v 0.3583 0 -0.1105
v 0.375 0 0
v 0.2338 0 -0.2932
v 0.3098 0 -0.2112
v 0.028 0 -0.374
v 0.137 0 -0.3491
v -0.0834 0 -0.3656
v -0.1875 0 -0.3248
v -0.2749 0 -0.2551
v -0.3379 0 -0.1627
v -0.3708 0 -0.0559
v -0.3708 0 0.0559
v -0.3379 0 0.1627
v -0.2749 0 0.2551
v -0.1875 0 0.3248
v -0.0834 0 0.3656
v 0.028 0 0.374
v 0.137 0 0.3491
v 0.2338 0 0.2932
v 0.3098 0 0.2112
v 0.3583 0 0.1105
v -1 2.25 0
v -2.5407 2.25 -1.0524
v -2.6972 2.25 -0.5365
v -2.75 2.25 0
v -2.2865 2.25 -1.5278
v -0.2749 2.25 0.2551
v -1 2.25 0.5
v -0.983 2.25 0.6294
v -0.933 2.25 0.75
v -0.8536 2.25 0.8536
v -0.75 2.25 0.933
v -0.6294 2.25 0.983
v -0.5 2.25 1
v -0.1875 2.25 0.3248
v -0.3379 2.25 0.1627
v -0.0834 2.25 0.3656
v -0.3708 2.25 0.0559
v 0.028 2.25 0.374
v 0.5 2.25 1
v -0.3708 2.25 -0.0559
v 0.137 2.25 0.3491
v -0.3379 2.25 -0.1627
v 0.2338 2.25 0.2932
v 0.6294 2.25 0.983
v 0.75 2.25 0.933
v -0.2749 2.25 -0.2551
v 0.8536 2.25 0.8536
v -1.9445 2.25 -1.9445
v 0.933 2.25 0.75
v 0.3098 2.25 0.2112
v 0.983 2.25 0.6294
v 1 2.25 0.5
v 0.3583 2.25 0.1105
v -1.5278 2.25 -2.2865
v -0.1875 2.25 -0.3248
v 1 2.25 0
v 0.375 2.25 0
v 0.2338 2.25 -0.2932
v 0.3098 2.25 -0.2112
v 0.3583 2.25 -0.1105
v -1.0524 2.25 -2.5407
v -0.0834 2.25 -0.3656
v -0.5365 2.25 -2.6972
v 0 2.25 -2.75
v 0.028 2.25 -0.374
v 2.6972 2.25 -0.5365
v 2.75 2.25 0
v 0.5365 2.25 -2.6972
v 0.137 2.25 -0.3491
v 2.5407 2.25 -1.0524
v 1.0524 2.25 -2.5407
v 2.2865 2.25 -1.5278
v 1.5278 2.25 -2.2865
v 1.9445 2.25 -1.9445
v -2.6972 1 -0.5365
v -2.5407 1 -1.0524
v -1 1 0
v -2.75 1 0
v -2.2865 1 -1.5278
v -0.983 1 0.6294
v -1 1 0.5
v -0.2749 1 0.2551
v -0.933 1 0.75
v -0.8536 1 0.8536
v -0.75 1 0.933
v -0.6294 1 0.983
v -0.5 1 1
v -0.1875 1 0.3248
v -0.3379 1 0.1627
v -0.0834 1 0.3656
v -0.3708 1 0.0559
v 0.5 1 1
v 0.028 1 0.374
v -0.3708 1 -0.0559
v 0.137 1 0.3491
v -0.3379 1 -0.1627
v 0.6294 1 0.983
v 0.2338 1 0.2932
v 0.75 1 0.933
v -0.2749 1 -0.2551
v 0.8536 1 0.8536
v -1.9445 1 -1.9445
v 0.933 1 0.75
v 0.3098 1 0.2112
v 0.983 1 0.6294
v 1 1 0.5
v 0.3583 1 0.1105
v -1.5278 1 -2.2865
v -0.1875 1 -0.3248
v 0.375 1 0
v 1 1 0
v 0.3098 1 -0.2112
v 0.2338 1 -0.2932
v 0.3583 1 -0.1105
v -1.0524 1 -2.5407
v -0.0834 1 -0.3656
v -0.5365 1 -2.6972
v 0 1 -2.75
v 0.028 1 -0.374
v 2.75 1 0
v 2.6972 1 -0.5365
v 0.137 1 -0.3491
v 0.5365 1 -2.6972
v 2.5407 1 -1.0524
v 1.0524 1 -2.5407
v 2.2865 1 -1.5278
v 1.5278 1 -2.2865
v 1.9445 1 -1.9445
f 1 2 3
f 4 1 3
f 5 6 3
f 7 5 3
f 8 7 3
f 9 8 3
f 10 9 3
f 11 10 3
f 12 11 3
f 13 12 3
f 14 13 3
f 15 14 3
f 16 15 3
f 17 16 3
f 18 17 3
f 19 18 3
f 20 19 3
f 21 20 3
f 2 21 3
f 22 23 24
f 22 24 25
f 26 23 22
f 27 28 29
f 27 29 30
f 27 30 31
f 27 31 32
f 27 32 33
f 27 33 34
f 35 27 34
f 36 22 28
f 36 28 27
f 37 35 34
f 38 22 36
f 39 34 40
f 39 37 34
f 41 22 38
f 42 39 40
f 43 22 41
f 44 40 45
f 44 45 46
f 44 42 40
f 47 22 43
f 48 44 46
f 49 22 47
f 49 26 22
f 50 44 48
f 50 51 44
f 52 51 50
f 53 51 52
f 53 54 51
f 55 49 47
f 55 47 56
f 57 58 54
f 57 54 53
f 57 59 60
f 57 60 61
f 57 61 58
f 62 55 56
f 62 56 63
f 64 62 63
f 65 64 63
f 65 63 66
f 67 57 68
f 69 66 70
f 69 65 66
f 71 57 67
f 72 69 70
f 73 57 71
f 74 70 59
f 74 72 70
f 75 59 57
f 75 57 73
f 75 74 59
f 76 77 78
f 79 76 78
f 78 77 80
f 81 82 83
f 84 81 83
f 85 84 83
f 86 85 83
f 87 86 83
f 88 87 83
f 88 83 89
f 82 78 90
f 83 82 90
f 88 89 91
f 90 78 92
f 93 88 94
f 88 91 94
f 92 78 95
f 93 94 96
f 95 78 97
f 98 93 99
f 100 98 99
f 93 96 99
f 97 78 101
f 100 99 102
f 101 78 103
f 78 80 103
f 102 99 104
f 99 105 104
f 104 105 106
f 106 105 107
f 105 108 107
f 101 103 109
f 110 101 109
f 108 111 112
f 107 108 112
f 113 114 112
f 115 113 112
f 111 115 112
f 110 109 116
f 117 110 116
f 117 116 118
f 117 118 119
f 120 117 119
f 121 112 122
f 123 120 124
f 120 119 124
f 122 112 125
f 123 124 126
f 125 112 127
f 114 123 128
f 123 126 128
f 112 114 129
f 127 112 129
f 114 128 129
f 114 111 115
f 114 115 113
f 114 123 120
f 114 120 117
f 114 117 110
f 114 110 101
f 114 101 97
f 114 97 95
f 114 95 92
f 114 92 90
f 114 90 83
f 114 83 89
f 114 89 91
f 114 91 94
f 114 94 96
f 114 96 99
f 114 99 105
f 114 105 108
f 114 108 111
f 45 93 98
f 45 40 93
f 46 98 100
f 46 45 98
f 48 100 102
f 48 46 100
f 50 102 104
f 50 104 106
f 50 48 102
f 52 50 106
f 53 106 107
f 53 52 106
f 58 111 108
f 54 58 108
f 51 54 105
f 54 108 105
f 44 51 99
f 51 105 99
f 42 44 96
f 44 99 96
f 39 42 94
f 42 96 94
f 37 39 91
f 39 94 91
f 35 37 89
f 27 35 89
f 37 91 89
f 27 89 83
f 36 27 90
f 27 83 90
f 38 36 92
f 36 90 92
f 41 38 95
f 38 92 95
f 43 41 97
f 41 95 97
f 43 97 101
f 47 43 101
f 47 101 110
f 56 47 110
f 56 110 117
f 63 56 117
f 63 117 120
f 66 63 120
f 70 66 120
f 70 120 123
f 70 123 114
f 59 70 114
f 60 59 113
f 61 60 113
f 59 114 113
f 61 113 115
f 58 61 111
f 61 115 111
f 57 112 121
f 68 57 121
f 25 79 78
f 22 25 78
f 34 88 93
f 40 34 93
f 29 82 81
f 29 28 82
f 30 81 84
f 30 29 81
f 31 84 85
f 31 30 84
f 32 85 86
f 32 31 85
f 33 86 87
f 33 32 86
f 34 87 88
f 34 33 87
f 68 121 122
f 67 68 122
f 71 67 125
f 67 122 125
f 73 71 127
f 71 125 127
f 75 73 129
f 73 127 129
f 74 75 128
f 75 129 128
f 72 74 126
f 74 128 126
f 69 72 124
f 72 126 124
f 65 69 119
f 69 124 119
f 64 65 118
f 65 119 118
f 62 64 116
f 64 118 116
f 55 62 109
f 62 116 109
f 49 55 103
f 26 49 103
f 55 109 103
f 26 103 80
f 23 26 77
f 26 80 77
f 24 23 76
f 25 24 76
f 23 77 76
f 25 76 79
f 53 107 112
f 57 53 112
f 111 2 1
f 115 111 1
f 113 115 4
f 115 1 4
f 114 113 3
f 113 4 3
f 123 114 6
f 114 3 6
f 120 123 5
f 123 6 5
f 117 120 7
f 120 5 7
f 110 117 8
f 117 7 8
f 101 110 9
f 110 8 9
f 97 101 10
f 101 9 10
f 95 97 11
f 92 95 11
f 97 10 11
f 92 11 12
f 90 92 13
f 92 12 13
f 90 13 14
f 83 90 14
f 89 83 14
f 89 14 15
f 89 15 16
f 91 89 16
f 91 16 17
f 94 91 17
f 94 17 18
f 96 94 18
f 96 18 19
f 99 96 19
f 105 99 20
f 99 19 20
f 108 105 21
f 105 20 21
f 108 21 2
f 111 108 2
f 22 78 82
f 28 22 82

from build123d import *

# Parameters (mm, degrees)
SKETCH2_R           = 0.375
BOSS_EXTRUDE1_DEPTH = 1
BOSS_EXTRUDE2_DEPTH = 1.25
FILLET1_R           = 0.5


with BuildPart() as part:
    # Sketch2 → Boss-Extrude1 (new body)
    with BuildSketch(Plane(origin=(0, 0, 0), x_dir=(1, 0, 0), z_dir=(0, 1, 0))):
        Circle(SKETCH2_R)
    extrude(amount=BOSS_EXTRUDE1_DEPTH)


with BuildPart() as body_2:
    # Sketch3 → Boss-Extrude2 (new body)
    with BuildSketch(Plane(origin=(0, 1, 0), x_dir=(1, 0, 0), z_dir=(0, 1, 0))):
        with BuildLine():
            ThreePointArc((2.75, 0), (0, 2.75), (-2.75, 0))
            Line((-2.75, 0), (-1, 0))
            Line((-1, 0), (-0.375, 0))
            ThreePointArc((-0.375, 0), (0, 0.375), (0.375, 0))
            Line((0.375, 0), (1, 0))
            Line((1, 0), (2.75, 0))
        make_face()
        with BuildLine():
            Line((-0.375, 0), (-1, 0))
            Line((-1, 0), (-1, -1))
            Line((-1, -1), (1, -1))
            Line((1, -1), (1, 0))
            Line((1, 0), (0.375, 0))
            ThreePointArc((0.375, 0), (0, -0.375), (-0.375, 0))
        make_face()
    extrude(amount=BOSS_EXTRUDE2_DEPTH)

    # Fillet1
    fillet1_edges = [body_2.edges().sort_by_distance(p)[0] for p in [
        (1, 1.625, 1),
        (-1, 1.625, 1),
    ]]
    fillet(fillet1_edges, radius=FILLET1_R)


solid = Compound([part.part, body_2.part])
